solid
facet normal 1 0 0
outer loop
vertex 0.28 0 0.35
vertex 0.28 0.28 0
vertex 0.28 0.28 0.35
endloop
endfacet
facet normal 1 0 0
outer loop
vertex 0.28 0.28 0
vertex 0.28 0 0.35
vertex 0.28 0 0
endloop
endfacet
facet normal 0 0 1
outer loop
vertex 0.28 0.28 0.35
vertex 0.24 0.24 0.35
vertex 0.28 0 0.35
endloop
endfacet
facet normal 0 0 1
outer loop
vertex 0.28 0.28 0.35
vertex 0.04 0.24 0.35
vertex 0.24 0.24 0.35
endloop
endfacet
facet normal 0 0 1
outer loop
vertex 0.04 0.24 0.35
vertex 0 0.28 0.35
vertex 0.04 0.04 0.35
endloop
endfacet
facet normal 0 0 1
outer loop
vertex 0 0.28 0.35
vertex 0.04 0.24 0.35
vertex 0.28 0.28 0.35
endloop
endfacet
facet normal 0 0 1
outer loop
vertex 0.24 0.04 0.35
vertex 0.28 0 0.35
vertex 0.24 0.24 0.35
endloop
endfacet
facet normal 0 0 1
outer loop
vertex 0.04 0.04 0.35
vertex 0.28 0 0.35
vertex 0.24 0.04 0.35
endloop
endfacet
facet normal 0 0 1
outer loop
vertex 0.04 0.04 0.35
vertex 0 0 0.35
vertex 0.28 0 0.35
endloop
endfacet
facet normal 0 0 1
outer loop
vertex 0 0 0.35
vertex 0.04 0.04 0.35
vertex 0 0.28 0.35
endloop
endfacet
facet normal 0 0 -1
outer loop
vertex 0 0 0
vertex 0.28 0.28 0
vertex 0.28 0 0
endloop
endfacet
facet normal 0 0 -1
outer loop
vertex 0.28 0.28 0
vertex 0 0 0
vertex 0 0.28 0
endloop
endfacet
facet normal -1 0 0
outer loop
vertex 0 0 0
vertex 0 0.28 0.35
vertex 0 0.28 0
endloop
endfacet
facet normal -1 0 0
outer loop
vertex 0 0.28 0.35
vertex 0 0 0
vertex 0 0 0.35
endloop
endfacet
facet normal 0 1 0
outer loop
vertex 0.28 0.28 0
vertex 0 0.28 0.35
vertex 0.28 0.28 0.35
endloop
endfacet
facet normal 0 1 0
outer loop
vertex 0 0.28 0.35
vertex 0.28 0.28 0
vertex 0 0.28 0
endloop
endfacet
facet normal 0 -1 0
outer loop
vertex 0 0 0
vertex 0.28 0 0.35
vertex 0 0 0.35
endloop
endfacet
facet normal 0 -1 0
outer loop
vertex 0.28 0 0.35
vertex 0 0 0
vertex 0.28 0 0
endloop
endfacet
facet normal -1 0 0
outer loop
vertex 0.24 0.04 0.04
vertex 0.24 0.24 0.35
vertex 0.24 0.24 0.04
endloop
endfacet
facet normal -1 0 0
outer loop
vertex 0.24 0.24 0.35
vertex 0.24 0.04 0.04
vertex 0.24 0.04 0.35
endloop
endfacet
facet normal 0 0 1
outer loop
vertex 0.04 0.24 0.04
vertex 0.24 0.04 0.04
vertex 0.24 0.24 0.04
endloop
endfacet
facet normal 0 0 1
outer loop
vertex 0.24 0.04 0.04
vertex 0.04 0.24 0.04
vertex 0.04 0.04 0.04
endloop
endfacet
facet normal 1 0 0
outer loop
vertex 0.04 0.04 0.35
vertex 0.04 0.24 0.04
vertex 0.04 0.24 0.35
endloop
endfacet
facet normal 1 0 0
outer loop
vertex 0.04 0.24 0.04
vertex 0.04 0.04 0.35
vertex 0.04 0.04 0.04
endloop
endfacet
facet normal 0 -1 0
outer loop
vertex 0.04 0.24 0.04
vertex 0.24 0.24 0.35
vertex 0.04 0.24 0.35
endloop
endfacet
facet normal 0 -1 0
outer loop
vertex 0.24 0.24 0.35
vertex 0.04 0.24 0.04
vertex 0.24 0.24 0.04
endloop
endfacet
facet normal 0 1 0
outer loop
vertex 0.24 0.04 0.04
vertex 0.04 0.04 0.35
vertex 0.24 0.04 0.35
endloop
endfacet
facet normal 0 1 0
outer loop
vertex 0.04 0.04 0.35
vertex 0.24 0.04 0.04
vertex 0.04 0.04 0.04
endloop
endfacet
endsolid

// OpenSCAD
// Breakaway Stub Isolation Cover - Flexible Rubber Extrusion
$fn = 64;

// Footprint matches the internal snap-channel boundary rules
cap_outer_x  = 0.28; // Inches
cap_outer_y  = 0.28; // Inches
cap_depth    = 0.35; // Inches (Provides deep surface isolation)
cap_wall     = 0.04; // 1mm wall thickness for snug rubber compression fit

module protective_rubber_cap() {
    difference() {
        // 1. Solid Outer Cap Protective Body
        cube([cap_outer_x, cap_outer_y, cap_depth]);
        
        // 2. Hollow Internal Press-Fit Core Cavity
        // Snugly slides over the fractured sub-surface gold lattice backbone stub
        translate([cap_wall, cap_wall, cap_wall])
            cube([cap_outer_x - (cap_wall * 2), cap_outer_y - (cap_wall * 2), cap_depth]);
    }
}

protective_rubber_cap();
